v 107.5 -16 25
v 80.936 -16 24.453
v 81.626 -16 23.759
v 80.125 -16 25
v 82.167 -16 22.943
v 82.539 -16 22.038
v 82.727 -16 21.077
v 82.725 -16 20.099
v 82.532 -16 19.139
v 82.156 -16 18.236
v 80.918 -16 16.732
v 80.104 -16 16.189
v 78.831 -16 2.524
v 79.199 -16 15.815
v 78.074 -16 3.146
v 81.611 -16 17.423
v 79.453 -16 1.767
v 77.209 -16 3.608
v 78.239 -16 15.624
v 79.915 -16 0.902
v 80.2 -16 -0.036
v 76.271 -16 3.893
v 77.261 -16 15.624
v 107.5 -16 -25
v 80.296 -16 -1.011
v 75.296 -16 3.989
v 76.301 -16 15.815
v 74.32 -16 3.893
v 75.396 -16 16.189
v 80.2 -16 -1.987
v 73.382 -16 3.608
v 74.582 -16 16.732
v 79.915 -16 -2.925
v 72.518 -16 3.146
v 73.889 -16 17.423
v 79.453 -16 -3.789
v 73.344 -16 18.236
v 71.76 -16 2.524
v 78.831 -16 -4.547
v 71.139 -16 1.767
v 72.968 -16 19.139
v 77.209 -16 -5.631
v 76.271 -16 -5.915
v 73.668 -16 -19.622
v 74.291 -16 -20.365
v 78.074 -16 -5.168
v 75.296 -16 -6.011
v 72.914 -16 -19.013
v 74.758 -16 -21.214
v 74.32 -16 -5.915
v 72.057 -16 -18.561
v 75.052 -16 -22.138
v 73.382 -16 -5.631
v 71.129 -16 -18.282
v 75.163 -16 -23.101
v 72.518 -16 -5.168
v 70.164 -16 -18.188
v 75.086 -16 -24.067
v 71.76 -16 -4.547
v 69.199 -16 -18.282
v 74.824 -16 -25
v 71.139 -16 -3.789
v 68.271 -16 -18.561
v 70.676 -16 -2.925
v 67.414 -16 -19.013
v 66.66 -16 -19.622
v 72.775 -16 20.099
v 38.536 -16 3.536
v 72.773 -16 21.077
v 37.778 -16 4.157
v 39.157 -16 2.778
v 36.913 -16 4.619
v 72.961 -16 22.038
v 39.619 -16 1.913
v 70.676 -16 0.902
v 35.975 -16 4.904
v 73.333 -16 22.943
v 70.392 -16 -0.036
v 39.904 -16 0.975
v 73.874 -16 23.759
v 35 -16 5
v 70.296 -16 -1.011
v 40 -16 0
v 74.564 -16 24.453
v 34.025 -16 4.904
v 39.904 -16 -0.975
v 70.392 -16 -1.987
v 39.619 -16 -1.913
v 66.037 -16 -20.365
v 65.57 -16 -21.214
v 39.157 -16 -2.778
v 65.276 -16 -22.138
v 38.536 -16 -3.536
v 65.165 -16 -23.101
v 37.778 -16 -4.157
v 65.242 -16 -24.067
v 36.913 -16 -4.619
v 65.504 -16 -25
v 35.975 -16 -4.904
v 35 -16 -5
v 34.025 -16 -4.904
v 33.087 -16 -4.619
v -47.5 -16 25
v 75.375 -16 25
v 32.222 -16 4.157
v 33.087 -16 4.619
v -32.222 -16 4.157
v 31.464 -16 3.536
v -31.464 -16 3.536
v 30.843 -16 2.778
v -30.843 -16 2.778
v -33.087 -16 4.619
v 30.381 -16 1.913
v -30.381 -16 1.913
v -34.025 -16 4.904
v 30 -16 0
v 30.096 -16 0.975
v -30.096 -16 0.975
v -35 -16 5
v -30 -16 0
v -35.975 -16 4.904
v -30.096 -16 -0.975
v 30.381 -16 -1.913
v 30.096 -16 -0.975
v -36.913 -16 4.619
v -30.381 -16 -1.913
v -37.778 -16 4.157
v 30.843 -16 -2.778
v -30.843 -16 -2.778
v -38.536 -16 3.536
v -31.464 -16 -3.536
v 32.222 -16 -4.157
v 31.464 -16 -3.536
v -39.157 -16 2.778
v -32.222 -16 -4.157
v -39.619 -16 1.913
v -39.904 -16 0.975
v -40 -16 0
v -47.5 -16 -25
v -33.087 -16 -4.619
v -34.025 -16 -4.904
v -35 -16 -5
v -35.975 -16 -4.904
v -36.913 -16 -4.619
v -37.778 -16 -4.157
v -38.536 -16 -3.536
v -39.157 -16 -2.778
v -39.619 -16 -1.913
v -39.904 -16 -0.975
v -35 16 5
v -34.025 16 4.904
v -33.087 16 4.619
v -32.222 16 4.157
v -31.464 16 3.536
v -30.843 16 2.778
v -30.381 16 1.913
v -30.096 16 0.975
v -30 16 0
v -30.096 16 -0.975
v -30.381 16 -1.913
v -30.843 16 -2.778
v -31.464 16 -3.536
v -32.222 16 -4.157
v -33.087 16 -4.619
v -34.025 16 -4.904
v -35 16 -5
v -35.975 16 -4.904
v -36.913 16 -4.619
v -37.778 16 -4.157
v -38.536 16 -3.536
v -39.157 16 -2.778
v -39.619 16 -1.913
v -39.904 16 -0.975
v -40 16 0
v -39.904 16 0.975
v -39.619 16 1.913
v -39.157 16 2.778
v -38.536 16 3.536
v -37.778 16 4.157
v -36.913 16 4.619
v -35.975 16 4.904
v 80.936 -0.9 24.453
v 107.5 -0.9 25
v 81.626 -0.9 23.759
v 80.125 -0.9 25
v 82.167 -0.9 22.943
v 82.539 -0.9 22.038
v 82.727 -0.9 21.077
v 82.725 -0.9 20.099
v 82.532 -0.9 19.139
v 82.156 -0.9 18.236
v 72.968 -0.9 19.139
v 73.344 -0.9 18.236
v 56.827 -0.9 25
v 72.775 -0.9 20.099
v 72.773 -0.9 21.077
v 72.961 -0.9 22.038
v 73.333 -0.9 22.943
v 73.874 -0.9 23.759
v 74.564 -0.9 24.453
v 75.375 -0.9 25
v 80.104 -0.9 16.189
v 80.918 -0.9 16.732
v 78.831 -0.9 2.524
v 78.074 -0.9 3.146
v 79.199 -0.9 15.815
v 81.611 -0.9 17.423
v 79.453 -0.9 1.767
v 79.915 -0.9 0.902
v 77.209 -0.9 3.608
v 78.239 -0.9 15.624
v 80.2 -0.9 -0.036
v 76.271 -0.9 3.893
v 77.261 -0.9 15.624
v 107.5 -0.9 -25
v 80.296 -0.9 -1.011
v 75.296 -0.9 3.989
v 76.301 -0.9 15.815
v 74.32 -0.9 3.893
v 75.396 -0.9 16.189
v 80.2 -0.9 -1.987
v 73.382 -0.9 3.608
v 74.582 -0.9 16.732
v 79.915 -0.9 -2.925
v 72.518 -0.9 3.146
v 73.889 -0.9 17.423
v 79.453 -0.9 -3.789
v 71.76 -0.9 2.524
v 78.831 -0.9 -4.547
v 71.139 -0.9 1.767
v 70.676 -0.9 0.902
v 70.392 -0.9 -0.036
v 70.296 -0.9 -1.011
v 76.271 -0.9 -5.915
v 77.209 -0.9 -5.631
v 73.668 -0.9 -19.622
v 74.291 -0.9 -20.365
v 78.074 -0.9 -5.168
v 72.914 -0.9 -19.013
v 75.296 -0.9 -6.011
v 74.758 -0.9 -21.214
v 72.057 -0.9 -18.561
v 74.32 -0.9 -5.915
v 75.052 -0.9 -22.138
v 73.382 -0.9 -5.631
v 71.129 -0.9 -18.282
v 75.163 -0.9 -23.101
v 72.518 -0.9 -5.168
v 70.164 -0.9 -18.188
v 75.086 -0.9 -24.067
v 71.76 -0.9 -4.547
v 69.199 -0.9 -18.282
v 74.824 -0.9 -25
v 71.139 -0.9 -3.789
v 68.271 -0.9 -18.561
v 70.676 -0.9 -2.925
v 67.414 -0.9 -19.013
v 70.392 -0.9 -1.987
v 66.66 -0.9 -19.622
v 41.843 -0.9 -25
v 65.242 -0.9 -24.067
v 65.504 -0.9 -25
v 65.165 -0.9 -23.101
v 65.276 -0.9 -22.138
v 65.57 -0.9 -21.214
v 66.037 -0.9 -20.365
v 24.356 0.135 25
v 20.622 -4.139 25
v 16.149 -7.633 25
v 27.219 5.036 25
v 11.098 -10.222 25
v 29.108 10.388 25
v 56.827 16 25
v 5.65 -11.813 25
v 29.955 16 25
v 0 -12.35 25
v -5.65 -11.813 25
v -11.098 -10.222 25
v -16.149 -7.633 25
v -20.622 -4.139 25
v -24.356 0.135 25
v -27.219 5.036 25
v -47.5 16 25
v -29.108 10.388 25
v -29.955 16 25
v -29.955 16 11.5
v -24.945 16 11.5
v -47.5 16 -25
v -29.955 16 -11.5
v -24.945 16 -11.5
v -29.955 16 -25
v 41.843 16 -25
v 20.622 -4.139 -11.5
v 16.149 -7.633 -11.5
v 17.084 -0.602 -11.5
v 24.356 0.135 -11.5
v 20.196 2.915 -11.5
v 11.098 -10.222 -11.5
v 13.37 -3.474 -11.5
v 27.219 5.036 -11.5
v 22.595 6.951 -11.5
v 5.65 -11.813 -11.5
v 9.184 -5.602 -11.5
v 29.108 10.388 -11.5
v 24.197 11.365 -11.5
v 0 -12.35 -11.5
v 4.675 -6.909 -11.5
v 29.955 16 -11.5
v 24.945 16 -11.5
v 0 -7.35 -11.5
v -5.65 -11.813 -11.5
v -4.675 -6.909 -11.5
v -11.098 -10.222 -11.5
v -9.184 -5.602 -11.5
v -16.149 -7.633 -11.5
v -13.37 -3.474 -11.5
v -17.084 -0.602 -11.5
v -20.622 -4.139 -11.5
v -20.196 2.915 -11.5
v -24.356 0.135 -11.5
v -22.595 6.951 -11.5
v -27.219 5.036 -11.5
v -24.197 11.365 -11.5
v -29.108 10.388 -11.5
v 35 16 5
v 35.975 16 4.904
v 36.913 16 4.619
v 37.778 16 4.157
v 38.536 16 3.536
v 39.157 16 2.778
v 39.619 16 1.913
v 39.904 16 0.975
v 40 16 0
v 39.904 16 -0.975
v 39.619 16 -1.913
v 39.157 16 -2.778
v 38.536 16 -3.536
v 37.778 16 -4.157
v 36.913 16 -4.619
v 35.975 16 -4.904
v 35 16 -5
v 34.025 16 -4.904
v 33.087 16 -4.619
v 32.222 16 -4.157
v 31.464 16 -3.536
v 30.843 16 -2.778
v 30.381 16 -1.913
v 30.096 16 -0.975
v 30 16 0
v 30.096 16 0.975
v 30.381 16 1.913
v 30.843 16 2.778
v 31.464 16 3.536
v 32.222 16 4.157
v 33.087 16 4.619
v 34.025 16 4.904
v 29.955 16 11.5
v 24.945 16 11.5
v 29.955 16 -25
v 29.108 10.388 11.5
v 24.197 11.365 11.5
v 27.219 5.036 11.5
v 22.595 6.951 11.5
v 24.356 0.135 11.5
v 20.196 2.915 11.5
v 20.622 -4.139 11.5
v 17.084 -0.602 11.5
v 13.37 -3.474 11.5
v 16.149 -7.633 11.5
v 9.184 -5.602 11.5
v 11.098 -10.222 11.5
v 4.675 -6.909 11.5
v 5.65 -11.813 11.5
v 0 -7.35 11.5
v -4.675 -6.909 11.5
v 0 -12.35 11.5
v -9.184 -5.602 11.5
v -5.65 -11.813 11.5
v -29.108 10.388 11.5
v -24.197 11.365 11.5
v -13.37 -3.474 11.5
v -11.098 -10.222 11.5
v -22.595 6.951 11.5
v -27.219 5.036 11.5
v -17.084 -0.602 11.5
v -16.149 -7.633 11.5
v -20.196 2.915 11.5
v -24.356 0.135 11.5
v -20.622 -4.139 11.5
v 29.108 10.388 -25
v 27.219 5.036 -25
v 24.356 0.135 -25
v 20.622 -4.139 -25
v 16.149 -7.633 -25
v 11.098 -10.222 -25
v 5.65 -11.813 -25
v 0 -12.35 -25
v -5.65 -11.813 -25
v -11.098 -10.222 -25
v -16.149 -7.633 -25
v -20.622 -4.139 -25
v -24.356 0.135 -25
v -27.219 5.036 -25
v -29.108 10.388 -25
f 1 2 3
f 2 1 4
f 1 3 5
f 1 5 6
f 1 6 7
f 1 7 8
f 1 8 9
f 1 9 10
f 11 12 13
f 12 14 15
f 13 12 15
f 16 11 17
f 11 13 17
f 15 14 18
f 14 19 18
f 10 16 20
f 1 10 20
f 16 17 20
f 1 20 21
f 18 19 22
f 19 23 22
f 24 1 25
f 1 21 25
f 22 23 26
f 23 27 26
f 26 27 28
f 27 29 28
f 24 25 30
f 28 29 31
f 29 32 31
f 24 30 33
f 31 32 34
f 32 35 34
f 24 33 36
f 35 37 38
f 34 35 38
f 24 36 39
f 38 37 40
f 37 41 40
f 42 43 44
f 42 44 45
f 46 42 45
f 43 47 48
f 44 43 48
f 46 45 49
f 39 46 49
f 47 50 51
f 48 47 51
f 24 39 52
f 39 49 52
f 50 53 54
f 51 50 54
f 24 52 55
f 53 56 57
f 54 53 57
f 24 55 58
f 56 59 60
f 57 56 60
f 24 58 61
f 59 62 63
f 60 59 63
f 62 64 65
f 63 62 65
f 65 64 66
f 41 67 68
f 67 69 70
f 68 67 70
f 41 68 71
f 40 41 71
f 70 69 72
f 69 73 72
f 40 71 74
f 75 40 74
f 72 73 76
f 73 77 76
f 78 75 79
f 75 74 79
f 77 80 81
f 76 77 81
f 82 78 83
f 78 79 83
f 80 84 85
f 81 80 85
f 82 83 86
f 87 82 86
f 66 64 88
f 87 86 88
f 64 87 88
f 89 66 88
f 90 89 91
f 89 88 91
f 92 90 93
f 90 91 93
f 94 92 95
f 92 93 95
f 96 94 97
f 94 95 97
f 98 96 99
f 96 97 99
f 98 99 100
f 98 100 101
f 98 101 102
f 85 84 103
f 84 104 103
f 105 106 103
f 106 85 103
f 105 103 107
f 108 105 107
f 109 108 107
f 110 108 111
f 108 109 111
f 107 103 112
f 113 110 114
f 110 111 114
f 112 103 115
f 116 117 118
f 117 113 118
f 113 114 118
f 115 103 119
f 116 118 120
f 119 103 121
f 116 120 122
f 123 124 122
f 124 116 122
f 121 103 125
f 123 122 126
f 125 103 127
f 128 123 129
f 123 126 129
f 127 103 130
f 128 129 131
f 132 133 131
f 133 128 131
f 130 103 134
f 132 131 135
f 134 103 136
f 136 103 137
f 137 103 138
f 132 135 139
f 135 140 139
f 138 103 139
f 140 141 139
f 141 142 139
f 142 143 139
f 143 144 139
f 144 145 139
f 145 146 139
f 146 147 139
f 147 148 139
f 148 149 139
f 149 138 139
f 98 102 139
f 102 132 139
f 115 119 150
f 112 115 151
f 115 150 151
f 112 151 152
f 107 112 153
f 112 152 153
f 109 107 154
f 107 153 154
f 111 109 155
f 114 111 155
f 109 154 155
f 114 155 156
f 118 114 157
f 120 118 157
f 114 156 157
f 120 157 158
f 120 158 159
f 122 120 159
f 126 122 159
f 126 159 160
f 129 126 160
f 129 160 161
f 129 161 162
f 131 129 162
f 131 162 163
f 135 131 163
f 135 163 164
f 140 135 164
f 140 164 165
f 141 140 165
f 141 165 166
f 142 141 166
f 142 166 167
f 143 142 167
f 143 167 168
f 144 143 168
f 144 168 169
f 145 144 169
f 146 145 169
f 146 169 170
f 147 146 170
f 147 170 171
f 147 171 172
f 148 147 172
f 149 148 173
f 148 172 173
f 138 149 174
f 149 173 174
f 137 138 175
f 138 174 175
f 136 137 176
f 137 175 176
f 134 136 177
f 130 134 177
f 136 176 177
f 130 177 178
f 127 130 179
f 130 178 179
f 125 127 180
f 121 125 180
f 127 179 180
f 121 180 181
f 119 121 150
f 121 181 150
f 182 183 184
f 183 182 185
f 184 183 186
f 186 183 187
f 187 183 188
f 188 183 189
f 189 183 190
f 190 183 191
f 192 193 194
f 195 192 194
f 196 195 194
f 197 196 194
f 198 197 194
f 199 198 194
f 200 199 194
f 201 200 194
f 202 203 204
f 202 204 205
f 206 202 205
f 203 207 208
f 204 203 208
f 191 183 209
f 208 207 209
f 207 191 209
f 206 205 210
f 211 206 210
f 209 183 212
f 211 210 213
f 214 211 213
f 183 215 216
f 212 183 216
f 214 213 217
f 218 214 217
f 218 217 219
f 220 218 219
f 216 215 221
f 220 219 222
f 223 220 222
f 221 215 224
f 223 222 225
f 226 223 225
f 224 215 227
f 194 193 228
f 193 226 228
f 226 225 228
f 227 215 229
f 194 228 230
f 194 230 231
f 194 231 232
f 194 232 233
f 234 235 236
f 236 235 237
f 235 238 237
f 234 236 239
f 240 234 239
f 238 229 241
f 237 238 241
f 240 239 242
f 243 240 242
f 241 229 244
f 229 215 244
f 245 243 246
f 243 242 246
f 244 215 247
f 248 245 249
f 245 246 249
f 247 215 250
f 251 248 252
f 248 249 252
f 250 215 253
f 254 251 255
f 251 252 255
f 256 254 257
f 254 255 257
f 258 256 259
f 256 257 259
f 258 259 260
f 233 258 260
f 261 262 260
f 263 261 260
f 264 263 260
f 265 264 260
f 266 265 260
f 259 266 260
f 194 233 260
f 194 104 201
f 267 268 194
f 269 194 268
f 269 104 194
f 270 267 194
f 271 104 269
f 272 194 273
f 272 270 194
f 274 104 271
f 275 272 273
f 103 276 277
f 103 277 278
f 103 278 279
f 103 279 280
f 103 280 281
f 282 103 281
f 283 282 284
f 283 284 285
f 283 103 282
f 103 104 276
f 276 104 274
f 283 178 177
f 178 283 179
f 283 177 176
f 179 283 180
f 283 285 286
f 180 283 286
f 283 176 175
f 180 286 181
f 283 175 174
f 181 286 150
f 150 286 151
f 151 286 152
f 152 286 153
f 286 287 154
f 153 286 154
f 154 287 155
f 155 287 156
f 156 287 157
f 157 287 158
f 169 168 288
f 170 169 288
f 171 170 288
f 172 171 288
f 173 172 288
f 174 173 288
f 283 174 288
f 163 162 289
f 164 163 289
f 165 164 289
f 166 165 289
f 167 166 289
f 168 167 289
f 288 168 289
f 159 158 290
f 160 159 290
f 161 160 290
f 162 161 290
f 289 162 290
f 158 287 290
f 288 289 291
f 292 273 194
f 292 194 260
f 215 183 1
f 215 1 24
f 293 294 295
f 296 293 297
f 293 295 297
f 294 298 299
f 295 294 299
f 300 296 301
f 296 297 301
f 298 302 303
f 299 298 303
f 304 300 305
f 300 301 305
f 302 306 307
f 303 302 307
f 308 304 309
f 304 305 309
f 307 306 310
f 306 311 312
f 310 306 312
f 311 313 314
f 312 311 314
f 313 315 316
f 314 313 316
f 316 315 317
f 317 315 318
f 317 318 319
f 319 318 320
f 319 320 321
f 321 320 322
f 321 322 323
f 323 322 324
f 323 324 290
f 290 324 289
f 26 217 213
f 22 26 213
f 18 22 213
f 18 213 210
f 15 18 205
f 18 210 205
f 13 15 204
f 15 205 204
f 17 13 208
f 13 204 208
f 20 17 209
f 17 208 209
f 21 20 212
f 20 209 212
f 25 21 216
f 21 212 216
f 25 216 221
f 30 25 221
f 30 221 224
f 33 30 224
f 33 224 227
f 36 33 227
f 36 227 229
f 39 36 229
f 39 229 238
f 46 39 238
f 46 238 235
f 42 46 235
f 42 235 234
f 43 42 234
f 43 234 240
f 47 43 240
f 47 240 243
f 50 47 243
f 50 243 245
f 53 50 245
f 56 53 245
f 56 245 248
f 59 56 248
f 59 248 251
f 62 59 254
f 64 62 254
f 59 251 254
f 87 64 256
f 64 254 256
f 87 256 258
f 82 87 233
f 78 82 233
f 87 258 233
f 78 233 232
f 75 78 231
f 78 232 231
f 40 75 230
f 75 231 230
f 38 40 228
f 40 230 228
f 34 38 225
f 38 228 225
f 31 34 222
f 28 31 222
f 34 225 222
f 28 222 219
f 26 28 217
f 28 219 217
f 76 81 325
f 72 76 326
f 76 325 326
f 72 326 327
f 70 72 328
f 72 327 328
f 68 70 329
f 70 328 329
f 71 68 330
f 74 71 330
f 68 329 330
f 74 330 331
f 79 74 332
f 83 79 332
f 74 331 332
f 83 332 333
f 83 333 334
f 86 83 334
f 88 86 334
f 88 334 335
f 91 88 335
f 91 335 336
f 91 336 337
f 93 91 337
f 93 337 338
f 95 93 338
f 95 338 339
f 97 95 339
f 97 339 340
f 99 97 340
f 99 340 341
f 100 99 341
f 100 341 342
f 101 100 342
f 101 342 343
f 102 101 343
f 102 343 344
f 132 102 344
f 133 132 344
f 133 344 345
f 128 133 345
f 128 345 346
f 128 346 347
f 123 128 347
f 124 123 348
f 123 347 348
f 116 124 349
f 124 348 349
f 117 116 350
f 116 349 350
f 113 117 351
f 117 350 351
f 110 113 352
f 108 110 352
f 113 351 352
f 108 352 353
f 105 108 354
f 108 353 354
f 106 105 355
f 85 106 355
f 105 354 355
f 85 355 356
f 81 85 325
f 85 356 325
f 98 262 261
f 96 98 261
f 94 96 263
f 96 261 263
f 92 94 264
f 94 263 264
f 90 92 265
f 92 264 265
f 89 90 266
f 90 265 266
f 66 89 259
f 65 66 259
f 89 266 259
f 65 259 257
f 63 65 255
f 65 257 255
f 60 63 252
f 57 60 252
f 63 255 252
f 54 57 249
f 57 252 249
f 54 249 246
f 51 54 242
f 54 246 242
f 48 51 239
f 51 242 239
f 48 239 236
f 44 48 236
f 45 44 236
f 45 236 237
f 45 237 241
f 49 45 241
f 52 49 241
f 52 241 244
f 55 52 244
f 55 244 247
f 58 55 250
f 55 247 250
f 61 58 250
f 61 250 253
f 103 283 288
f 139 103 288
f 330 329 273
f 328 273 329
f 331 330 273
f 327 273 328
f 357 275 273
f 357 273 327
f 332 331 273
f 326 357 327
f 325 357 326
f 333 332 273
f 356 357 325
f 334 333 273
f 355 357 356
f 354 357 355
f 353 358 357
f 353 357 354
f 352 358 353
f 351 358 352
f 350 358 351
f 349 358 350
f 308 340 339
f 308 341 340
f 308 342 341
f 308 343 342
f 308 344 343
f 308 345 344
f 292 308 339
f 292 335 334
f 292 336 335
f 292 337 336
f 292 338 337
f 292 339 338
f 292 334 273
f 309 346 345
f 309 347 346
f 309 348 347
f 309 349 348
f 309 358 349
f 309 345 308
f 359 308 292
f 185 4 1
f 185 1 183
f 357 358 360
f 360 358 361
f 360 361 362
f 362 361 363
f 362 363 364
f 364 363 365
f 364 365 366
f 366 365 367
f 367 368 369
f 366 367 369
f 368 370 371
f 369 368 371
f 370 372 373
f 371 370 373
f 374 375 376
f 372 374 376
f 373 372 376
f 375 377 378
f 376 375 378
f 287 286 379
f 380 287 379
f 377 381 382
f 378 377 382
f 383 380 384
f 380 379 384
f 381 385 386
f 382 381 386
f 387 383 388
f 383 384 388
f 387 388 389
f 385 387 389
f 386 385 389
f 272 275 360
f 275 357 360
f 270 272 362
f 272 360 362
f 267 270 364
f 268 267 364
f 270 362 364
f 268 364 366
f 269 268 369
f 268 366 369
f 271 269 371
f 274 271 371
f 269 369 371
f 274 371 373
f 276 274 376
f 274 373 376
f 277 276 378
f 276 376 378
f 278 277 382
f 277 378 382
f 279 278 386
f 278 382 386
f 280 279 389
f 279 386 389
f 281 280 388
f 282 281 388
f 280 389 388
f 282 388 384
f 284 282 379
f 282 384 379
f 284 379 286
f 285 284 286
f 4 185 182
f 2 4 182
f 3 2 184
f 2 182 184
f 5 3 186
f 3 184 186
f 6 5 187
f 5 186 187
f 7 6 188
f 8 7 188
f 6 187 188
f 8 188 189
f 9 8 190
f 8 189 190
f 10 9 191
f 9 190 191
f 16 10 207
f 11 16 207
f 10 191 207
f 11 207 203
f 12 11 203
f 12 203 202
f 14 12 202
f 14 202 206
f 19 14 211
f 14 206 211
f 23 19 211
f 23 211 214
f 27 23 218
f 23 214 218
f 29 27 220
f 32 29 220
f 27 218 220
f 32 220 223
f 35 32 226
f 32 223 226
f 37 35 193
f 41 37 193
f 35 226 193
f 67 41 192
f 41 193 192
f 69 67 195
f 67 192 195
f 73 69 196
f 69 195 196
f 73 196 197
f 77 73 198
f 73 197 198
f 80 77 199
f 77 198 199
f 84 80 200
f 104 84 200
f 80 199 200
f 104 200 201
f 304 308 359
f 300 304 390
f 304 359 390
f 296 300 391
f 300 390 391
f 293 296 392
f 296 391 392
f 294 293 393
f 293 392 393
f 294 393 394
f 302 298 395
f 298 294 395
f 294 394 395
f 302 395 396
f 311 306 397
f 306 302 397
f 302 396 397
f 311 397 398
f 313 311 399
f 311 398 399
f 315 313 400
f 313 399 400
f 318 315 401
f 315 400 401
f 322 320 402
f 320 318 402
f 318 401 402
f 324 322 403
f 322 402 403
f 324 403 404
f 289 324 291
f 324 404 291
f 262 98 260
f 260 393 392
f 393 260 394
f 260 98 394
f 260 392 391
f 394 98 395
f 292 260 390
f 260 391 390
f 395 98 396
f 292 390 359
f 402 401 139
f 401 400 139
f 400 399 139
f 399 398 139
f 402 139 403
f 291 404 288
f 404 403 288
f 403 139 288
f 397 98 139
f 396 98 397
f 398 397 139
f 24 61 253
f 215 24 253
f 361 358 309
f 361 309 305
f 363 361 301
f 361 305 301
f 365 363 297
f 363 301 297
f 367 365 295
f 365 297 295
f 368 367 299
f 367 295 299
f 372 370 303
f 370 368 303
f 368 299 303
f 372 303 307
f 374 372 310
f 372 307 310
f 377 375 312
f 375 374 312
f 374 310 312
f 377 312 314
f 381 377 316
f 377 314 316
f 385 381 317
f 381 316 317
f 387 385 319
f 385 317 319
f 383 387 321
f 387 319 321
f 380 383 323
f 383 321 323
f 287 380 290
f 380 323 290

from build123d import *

# Parameters (mm, degrees)
SKETCH1_W           = 50
SKETCH1_H           = 32
BOSS_EXTRUDE1_DEPTH = 47.5
SKETCH5_W           = 50
SKETCH5_H           = 32
BOSS_EXTRUDE2_DEPTH = 60
SKETCH4_R           = 5
CUT_EXTRUDE1_DEPTH  = 75
CUT_EXTRUDE2_DEPTH  = 16.9


with BuildPart() as part:
    # Sketch1 → Boss-Extrude1 (new, symmetric)
    with BuildSketch(Plane(origin=(0, 0, 0), x_dir=(0, 0, -1), z_dir=(1, 0, 0))):
        Rectangle(SKETCH1_W, SKETCH1_H)
    extrude(amount=BOSS_EXTRUDE1_DEPTH, both=True)

    # Sketch3 → Cut-Revolve1 (revolve, cut)
    with BuildSketch(Plane(origin=(0, 0, 0), x_dir=(0, 0, -1), z_dir=(1, 0, 0))):
        Polygon((-25, -12.35), (-11.5, -12.35), (-11.5, -7.35), (11.5, -7.35), (11.5, -12.35), (25, -12.35), (25, 16.59588936), (-25, 16.59588936), align=None)
    revolve(axis=Axis((0, 17.65, -20.249126458), (0, 0, -1)), mode=Mode.SUBTRACT)

    # Sketch5 → Boss-Extrude2 (add)
    with BuildSketch(Plane(origin=(47.5, 0, 0), x_dir=(0, 0, -1), z_dir=(1, 0, 0))):
        Rectangle(SKETCH5_W, SKETCH5_H)
    extrude(amount=BOSS_EXTRUDE2_DEPTH)

    # Sketch4 → Cut-Extrude1 (cut)
    with BuildSketch(Plane(origin=(0, 16, 0), x_dir=(1, 0, 0), z_dir=(0, 1, 0))):
        with Locations(Location((-35, 0, 0), (0, 0, 270))):
            Circle(SKETCH4_R)
        with Locations(Location((35, 0, 0), (0, 0, 270))):
            Circle(SKETCH4_R)
        with Locations((77.75, -20.6)):
            Circle(SKETCH4_R)
        with Locations(Location((75.295878395, 1.01110333, 0), (0, 0, 270))):
            Circle(SKETCH4_R)
        with Locations((70.163995975, 23.188381743)):
            Circle(SKETCH4_R)
    extrude(amount=-CUT_EXTRUDE1_DEPTH, mode=Mode.SUBTRACT)

    # Sketch6 → Cut-Extrude2 (cut)
    with BuildSketch(Plane(origin=(0, 16, 0), x_dir=(1, 0, 0), z_dir=(0, 1, 0))):
        Polygon((97.41116956, -160.42016543), (40, 31.15), (103.809557411, 50.272921943), (161.220726971, -141.297243487), align=None)
    extrude(amount=-CUT_EXTRUDE2_DEPTH, mode=Mode.SUBTRACT)


solid = part.part
